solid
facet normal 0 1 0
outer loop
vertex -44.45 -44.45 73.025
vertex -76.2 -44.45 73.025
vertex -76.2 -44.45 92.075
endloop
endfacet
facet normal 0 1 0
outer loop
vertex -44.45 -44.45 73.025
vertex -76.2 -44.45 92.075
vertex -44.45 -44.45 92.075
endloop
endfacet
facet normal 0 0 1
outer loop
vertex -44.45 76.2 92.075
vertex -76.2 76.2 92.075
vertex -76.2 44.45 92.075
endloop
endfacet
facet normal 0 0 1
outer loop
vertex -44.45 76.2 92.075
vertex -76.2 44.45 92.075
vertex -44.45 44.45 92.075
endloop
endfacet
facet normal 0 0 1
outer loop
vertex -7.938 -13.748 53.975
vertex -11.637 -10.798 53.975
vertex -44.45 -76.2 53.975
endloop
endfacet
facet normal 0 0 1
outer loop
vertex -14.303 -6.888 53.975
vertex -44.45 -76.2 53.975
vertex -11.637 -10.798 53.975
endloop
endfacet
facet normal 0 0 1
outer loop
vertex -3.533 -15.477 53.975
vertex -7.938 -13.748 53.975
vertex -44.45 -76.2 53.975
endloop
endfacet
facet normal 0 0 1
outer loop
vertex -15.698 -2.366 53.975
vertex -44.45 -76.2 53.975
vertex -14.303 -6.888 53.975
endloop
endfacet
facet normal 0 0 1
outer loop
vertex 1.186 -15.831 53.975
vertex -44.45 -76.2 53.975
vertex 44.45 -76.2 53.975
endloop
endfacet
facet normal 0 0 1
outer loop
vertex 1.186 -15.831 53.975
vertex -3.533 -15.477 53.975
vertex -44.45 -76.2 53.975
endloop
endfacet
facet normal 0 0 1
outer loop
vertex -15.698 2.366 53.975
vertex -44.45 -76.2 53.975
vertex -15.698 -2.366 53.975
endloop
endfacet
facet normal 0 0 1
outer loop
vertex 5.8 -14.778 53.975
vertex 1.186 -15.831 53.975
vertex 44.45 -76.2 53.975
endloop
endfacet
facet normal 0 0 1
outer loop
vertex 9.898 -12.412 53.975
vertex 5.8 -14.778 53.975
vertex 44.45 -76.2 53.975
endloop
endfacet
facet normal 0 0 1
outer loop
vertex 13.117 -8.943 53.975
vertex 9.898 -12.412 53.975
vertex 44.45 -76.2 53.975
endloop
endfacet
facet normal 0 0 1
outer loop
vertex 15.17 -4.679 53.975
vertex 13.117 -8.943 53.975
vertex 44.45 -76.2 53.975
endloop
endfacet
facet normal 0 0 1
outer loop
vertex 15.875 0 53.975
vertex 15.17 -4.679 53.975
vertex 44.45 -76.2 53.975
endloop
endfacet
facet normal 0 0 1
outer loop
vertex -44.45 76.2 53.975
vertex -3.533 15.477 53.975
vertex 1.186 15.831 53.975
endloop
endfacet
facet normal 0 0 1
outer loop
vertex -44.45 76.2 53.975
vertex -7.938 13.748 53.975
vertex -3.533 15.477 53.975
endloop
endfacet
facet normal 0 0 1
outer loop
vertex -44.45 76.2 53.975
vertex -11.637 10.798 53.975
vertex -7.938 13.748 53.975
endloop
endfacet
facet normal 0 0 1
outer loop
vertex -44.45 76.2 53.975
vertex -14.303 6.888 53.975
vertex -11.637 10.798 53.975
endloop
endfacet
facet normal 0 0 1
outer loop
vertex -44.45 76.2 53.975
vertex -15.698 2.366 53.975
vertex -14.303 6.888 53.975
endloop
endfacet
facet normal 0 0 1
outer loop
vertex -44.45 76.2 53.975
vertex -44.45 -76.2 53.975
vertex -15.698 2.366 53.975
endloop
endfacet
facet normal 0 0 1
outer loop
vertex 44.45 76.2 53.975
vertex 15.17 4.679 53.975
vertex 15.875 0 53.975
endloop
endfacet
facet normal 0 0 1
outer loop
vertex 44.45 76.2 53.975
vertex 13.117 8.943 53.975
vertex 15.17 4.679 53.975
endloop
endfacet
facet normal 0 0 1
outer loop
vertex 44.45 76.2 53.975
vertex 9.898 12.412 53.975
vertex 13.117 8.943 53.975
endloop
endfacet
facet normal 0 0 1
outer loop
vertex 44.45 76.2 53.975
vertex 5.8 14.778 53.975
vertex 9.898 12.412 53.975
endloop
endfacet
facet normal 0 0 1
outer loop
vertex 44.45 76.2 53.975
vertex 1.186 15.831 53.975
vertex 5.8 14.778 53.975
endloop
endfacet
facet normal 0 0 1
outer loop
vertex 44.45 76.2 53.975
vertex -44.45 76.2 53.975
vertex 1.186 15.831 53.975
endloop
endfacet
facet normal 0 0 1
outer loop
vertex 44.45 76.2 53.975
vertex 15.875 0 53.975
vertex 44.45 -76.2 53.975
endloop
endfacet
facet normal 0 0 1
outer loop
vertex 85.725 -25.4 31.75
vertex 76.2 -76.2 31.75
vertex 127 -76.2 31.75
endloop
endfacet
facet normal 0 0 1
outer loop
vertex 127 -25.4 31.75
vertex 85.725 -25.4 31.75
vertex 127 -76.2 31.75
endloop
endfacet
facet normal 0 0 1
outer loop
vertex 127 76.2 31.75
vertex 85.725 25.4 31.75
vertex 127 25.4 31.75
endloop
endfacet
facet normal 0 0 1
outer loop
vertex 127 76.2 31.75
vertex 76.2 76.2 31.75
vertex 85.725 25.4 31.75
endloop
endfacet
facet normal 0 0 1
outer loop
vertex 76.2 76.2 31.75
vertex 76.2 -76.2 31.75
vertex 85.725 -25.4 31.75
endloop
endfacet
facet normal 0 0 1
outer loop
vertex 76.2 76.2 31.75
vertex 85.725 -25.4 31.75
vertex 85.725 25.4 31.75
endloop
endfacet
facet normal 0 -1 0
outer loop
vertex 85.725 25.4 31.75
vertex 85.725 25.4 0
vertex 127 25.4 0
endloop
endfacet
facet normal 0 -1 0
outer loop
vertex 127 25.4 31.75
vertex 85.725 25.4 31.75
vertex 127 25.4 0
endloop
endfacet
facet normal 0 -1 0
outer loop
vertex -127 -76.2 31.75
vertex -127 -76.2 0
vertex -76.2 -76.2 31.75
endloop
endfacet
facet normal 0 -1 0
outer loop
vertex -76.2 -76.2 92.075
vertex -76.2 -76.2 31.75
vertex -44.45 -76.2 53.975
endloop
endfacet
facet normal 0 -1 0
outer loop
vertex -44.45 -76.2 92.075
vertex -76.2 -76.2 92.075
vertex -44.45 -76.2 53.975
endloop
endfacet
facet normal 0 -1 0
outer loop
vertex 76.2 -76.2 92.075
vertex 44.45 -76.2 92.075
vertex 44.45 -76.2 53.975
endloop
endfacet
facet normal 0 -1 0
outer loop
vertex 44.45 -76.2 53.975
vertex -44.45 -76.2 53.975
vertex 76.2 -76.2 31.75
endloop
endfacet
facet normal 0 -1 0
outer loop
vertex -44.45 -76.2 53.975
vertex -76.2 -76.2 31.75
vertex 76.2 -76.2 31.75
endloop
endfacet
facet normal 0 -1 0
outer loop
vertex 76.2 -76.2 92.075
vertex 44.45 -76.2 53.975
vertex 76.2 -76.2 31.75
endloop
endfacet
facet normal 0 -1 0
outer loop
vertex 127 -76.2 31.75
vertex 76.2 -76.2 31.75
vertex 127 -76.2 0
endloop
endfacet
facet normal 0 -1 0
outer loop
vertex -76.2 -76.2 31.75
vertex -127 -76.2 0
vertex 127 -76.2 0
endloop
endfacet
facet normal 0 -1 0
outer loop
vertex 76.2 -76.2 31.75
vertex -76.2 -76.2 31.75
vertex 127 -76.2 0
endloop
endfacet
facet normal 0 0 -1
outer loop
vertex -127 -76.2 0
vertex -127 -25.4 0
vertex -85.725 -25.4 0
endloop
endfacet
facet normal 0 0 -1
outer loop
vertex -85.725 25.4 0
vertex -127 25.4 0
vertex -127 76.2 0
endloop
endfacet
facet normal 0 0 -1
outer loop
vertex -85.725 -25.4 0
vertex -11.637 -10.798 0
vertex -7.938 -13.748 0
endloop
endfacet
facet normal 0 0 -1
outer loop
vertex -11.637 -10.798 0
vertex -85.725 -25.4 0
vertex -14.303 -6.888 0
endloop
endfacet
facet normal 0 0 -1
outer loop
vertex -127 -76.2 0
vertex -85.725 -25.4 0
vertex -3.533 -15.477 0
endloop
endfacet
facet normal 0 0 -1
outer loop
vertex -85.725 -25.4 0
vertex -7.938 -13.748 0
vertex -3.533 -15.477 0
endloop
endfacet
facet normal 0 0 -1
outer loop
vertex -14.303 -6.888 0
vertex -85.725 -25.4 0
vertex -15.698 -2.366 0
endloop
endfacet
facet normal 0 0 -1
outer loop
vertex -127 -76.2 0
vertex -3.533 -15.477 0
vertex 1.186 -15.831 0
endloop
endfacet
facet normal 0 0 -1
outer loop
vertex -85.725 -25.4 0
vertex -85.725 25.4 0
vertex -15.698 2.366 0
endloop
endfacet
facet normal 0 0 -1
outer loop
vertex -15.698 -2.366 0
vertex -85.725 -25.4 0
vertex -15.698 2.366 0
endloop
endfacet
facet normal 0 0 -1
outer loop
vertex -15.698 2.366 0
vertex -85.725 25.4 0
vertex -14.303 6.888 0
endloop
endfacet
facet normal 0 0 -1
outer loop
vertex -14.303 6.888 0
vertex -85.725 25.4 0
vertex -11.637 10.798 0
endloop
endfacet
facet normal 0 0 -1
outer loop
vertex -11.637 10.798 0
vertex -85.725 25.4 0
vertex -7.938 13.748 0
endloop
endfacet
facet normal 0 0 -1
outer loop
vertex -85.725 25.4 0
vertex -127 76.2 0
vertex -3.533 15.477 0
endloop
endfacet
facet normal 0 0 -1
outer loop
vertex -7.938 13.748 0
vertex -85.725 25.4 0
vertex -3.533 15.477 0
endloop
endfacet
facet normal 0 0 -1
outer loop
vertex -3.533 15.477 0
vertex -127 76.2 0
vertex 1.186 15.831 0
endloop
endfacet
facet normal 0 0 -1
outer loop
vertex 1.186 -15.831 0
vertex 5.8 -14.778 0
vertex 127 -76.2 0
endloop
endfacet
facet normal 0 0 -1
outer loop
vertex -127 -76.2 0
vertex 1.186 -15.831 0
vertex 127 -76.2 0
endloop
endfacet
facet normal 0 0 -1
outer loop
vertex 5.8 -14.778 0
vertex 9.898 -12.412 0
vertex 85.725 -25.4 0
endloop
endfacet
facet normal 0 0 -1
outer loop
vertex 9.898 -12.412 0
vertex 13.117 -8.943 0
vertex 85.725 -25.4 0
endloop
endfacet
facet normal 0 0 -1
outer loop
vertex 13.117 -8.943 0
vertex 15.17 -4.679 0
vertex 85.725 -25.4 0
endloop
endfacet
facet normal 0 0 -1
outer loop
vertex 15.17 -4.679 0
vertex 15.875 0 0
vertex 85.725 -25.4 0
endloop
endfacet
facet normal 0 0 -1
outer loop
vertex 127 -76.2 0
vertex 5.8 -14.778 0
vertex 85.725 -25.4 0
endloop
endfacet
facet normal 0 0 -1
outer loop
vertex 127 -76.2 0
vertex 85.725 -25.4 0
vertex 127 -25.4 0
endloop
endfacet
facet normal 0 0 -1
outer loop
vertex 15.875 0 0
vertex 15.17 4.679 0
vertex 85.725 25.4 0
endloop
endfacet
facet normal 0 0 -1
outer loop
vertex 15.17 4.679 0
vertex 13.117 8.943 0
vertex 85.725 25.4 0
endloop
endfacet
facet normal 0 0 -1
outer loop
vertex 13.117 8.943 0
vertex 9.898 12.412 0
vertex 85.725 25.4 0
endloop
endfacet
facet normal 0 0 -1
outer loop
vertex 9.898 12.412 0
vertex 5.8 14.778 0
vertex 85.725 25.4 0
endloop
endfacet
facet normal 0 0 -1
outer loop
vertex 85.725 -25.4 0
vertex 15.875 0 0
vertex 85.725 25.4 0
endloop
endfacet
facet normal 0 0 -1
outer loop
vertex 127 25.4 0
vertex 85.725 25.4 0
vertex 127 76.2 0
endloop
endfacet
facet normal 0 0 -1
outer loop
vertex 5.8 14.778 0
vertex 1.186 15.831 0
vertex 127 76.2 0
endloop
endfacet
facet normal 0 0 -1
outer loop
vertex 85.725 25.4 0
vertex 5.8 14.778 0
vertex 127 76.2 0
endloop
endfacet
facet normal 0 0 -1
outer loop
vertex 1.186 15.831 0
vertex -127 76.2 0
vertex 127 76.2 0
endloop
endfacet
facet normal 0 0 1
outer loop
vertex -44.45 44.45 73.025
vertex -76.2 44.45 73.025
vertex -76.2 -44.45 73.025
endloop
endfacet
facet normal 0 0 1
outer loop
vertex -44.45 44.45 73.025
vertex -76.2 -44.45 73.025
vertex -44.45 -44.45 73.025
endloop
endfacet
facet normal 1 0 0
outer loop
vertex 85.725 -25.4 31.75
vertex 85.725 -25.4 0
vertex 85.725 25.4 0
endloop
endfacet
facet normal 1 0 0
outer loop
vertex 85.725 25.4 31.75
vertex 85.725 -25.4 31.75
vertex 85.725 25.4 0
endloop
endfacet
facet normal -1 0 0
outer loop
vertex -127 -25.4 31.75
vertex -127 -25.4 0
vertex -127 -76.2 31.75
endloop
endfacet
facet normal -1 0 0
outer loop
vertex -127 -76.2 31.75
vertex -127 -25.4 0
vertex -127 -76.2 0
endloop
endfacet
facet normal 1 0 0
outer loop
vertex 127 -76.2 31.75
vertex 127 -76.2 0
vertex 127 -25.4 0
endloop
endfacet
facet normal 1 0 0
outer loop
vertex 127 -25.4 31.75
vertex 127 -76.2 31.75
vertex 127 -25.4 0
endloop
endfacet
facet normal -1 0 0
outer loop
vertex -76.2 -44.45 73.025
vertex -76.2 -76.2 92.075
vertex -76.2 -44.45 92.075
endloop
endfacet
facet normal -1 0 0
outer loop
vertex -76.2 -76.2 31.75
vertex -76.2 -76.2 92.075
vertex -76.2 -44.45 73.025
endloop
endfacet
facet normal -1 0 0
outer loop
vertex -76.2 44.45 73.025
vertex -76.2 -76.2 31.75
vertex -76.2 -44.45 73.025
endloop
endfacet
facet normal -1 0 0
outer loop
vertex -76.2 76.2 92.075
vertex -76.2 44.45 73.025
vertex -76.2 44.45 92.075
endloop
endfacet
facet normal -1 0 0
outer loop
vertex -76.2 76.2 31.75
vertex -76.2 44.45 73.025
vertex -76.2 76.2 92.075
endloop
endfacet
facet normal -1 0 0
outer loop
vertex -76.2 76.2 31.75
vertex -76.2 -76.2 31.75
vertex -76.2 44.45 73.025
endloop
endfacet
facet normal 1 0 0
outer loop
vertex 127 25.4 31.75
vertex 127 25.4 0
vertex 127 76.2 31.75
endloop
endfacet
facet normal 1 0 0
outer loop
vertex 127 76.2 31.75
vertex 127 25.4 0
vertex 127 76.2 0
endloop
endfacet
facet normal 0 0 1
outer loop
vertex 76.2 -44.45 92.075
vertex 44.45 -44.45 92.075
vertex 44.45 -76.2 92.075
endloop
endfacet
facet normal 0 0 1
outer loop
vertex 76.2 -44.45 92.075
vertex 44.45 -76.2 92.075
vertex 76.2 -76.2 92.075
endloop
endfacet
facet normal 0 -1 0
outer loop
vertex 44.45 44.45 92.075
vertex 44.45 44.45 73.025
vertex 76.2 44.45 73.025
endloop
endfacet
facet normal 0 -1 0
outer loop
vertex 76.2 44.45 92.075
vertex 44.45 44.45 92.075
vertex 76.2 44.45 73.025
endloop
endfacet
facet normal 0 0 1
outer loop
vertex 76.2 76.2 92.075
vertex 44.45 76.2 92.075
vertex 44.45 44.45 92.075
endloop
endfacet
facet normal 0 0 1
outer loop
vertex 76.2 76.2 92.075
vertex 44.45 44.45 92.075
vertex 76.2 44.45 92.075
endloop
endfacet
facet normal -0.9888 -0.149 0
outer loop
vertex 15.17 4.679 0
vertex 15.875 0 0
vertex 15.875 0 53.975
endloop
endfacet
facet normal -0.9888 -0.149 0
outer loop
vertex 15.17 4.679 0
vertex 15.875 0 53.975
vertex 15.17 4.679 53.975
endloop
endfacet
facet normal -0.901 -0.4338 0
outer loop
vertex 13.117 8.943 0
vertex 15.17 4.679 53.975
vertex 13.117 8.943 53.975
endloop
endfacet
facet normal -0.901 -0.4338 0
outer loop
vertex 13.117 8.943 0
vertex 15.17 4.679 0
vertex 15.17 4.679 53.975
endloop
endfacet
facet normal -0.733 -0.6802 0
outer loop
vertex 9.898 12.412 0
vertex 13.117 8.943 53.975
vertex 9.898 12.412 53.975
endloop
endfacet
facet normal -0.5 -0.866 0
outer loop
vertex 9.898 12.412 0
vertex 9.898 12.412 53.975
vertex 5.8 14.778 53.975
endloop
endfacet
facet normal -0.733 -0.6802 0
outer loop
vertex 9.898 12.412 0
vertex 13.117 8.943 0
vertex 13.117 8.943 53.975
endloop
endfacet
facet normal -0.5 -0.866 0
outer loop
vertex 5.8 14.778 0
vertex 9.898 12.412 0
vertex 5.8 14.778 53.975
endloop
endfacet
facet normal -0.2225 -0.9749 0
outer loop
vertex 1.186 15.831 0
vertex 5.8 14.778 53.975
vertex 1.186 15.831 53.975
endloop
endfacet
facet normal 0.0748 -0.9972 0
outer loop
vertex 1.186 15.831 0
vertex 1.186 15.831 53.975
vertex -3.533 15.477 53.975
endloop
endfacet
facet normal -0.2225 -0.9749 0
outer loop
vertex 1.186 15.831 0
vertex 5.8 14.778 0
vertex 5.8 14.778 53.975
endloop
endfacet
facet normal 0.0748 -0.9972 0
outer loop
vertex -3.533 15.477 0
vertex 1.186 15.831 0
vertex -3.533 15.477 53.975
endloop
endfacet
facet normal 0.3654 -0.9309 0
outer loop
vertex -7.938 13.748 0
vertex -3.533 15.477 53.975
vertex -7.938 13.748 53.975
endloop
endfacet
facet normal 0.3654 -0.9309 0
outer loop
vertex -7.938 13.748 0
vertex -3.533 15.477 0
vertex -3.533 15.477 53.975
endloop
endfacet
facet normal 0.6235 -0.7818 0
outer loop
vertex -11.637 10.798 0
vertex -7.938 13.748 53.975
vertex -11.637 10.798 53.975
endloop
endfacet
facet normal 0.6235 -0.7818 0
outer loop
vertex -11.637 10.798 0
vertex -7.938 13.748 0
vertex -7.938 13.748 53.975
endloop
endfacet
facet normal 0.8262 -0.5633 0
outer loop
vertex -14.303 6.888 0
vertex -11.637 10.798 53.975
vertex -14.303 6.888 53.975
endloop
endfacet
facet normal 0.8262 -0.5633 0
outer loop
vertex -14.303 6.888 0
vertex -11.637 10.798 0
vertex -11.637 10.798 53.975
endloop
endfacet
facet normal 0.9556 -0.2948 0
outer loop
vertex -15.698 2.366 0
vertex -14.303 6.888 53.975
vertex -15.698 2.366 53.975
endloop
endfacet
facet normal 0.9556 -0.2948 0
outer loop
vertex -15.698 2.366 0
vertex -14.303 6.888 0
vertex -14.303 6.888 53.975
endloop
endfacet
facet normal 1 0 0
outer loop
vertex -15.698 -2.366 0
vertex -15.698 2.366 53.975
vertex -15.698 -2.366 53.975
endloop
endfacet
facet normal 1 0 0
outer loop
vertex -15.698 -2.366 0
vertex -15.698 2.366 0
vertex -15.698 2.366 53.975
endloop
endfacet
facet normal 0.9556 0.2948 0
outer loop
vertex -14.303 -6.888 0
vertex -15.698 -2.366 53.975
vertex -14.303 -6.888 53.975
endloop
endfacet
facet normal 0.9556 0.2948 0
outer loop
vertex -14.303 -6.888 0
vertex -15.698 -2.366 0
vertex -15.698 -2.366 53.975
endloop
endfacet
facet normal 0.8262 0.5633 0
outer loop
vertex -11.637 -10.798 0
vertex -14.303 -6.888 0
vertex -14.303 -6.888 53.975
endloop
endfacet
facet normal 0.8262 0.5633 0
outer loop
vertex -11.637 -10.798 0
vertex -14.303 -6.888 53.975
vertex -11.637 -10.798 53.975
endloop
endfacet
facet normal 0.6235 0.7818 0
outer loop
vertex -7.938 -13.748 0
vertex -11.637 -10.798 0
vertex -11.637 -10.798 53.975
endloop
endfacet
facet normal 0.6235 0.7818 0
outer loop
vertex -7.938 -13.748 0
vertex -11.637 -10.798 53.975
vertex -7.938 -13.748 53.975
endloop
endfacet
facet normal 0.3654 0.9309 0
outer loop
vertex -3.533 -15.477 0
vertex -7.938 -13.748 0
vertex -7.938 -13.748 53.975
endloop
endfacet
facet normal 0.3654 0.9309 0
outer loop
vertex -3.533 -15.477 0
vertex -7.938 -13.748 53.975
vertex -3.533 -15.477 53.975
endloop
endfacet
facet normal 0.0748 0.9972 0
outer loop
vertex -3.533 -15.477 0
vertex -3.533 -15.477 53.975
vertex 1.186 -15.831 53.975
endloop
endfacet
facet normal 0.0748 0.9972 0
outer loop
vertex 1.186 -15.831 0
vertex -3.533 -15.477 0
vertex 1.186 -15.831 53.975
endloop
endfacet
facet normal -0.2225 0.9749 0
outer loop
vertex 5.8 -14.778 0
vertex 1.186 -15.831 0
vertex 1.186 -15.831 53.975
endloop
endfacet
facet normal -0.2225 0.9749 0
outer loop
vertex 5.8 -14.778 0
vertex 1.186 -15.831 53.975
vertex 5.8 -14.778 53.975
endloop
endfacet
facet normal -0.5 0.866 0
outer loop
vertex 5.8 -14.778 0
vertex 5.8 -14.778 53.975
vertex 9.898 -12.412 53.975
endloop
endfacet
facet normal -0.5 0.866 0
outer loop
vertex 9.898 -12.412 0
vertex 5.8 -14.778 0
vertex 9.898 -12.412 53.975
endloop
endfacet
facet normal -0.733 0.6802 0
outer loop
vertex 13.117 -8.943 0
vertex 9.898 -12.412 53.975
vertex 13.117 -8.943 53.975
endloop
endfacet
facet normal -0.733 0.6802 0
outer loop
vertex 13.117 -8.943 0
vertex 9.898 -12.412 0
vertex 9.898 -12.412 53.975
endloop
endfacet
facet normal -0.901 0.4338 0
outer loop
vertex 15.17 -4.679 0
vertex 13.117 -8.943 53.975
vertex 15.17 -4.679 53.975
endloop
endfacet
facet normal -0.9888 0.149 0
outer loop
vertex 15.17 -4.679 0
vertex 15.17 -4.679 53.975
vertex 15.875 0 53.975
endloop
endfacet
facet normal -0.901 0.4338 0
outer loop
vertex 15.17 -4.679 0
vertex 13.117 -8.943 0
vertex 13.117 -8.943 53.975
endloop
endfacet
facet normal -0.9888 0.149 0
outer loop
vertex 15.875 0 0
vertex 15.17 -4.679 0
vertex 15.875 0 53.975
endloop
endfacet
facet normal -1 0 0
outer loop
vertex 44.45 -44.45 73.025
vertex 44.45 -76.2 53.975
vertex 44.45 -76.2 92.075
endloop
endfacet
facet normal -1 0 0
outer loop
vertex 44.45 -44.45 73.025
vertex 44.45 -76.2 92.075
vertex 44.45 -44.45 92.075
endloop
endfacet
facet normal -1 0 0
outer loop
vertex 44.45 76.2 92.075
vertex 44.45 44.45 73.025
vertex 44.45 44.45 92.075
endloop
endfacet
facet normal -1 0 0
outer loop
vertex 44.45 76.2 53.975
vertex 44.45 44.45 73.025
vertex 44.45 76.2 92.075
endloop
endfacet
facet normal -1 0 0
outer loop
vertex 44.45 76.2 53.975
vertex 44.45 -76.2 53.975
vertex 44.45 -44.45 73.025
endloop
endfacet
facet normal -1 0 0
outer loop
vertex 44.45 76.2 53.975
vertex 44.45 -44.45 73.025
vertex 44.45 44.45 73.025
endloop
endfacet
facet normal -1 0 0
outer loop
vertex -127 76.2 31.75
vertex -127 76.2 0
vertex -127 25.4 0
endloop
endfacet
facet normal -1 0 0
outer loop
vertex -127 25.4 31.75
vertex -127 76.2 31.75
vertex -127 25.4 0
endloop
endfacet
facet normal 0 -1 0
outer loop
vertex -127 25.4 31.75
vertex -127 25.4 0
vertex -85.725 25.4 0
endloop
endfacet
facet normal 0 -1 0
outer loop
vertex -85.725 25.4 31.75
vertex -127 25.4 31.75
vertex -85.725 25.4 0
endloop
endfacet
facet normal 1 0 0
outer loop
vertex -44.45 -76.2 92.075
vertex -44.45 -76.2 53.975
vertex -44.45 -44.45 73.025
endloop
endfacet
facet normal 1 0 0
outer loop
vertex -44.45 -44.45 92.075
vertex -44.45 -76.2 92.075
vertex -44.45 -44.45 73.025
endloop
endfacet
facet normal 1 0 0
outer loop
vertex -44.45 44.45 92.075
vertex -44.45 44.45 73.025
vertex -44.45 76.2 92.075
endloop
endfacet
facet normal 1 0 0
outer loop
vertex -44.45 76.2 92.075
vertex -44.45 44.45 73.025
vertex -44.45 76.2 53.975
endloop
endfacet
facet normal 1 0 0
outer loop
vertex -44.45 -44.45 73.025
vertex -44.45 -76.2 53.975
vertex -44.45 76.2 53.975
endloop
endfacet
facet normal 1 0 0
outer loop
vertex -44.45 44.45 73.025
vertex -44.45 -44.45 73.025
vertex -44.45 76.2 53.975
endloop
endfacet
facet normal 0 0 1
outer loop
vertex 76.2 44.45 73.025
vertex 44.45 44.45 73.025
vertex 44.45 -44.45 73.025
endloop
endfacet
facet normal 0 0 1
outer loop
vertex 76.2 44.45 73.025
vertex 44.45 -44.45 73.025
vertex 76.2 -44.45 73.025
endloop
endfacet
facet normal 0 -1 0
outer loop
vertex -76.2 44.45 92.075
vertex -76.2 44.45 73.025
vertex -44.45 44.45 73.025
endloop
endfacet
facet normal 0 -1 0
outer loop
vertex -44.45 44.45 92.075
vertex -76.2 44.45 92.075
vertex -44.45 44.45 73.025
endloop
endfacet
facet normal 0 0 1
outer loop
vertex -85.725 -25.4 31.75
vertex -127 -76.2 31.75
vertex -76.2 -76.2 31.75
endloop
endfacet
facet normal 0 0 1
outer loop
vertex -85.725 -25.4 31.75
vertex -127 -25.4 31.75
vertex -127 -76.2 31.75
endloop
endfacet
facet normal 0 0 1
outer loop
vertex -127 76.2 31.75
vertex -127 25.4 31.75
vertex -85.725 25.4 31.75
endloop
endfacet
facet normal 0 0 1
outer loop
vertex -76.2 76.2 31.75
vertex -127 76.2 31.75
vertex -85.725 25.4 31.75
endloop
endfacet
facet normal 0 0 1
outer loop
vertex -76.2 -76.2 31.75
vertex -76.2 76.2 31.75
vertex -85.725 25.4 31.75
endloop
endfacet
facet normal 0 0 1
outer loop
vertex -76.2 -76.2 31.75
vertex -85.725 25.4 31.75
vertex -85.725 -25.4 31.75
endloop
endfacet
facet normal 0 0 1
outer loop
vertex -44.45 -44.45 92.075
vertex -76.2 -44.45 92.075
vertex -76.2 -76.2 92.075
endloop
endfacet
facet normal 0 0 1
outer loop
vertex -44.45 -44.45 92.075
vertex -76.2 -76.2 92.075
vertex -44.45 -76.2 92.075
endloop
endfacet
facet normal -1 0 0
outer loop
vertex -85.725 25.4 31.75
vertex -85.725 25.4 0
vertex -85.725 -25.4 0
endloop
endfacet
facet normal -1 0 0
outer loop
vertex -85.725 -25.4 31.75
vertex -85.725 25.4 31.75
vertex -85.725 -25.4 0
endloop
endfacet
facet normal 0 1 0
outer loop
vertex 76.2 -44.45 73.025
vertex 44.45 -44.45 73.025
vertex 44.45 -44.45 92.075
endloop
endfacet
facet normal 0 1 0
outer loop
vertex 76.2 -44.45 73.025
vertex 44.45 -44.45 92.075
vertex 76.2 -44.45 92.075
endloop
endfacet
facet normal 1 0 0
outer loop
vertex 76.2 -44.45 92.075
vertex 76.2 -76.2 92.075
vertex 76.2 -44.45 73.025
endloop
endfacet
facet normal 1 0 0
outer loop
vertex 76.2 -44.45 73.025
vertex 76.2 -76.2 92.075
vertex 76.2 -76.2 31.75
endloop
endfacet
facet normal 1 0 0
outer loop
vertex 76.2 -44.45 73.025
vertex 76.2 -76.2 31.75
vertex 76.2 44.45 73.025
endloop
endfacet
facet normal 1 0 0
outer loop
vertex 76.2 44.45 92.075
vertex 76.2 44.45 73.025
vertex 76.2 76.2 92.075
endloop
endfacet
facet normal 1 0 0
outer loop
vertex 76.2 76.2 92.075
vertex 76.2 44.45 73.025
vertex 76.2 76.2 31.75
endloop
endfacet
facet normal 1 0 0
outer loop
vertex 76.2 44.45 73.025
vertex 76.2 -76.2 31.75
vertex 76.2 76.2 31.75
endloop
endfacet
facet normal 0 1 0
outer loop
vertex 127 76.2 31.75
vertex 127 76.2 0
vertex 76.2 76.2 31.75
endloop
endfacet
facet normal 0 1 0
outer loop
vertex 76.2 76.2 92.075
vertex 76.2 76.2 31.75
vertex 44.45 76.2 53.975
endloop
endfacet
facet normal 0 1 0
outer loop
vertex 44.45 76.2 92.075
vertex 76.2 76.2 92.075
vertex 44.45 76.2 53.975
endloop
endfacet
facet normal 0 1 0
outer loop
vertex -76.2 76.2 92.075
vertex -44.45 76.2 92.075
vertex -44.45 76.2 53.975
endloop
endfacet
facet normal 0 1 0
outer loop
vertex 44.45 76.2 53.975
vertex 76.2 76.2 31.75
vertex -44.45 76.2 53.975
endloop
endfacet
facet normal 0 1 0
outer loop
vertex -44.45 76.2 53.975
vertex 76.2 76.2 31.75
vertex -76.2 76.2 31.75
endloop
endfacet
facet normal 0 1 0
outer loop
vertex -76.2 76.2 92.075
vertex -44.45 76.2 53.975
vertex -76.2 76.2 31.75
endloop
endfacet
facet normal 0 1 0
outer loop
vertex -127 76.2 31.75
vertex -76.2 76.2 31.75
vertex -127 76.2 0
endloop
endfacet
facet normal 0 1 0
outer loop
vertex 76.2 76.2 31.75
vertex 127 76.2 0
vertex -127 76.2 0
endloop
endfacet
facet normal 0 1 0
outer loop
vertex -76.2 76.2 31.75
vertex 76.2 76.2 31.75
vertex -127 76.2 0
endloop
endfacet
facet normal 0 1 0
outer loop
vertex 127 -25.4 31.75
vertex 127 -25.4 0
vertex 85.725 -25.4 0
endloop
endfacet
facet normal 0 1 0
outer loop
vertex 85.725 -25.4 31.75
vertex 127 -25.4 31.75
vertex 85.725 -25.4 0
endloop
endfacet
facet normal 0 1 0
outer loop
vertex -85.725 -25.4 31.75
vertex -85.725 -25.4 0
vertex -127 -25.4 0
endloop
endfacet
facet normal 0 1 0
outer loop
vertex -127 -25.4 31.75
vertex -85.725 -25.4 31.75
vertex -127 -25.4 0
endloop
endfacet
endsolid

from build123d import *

# Parameters (mm, degrees)
F1_DEPTH = 31.75
F0_W     = 31.75
F0_H     = 31.75
F2_DEPTH = 92.075
F0_H_2   = 88.9
F3_DEPTH = 73.025
F0_R     = 15.875
F4_DEPTH = 53.975


with BuildPart() as f1:
    # F0 (on Top) → F1 (new body)
    with BuildSketch(Plane.XY):
        Polygon((-127, -76.2), (-76.2, -76.2), (-76.2, -44.45), (-76.2, 44.45), (-76.2, 76.2), (-127, 76.2), (-127, 25.4), (-85.725, 25.4), (-85.725, -25.4), (-127, -25.4), align=None)
        Polygon((76.2, -76.2), (127, -76.2), (127, -25.4), (85.725, -25.4), (85.725, 25.4), (127, 25.4), (127, 76.2), (76.2, 76.2), (76.2, 44.45), (76.2, -44.45), align=None)
    extrude(amount=F1_DEPTH)

    # F0 (on Top) → F2 (join)
    with BuildSketch(Plane.XY):
        with Locations((-60.325, 60.325)):
            Rectangle(F0_W, F0_H)
        with Locations((-60.325, -60.325)):
            Rectangle(F0_W, F0_H)
        with Locations((60.325, -60.325)):
            Rectangle(F0_W, F0_H)
        with Locations((60.325, 60.325)):
            Rectangle(F0_W, F0_H)
    extrude(amount=F2_DEPTH)

    # F0 (on Top) → F3 (join)
    with BuildSketch(Plane.XY):
        with Locations((-60.325, 0)):
            Rectangle(F0_W, F0_H_2)
        with Locations((60.325, 0)):
            Rectangle(F0_W, F0_H_2)
    extrude(amount=F3_DEPTH)

    # F0 (on Top) → F4 (join)
    with BuildSketch(Plane.XY):
        Polygon((-44.45, -76.2), (44.45, -76.2), (44.45, -44.45), (44.45, 44.45), (44.45, 76.2), (-44.45, 76.2), (-44.45, 44.45), (-44.45, -44.45), align=None)
        Circle(F0_R, mode=Mode.SUBTRACT)
    extrude(amount=F4_DEPTH)


solid = f1.part
